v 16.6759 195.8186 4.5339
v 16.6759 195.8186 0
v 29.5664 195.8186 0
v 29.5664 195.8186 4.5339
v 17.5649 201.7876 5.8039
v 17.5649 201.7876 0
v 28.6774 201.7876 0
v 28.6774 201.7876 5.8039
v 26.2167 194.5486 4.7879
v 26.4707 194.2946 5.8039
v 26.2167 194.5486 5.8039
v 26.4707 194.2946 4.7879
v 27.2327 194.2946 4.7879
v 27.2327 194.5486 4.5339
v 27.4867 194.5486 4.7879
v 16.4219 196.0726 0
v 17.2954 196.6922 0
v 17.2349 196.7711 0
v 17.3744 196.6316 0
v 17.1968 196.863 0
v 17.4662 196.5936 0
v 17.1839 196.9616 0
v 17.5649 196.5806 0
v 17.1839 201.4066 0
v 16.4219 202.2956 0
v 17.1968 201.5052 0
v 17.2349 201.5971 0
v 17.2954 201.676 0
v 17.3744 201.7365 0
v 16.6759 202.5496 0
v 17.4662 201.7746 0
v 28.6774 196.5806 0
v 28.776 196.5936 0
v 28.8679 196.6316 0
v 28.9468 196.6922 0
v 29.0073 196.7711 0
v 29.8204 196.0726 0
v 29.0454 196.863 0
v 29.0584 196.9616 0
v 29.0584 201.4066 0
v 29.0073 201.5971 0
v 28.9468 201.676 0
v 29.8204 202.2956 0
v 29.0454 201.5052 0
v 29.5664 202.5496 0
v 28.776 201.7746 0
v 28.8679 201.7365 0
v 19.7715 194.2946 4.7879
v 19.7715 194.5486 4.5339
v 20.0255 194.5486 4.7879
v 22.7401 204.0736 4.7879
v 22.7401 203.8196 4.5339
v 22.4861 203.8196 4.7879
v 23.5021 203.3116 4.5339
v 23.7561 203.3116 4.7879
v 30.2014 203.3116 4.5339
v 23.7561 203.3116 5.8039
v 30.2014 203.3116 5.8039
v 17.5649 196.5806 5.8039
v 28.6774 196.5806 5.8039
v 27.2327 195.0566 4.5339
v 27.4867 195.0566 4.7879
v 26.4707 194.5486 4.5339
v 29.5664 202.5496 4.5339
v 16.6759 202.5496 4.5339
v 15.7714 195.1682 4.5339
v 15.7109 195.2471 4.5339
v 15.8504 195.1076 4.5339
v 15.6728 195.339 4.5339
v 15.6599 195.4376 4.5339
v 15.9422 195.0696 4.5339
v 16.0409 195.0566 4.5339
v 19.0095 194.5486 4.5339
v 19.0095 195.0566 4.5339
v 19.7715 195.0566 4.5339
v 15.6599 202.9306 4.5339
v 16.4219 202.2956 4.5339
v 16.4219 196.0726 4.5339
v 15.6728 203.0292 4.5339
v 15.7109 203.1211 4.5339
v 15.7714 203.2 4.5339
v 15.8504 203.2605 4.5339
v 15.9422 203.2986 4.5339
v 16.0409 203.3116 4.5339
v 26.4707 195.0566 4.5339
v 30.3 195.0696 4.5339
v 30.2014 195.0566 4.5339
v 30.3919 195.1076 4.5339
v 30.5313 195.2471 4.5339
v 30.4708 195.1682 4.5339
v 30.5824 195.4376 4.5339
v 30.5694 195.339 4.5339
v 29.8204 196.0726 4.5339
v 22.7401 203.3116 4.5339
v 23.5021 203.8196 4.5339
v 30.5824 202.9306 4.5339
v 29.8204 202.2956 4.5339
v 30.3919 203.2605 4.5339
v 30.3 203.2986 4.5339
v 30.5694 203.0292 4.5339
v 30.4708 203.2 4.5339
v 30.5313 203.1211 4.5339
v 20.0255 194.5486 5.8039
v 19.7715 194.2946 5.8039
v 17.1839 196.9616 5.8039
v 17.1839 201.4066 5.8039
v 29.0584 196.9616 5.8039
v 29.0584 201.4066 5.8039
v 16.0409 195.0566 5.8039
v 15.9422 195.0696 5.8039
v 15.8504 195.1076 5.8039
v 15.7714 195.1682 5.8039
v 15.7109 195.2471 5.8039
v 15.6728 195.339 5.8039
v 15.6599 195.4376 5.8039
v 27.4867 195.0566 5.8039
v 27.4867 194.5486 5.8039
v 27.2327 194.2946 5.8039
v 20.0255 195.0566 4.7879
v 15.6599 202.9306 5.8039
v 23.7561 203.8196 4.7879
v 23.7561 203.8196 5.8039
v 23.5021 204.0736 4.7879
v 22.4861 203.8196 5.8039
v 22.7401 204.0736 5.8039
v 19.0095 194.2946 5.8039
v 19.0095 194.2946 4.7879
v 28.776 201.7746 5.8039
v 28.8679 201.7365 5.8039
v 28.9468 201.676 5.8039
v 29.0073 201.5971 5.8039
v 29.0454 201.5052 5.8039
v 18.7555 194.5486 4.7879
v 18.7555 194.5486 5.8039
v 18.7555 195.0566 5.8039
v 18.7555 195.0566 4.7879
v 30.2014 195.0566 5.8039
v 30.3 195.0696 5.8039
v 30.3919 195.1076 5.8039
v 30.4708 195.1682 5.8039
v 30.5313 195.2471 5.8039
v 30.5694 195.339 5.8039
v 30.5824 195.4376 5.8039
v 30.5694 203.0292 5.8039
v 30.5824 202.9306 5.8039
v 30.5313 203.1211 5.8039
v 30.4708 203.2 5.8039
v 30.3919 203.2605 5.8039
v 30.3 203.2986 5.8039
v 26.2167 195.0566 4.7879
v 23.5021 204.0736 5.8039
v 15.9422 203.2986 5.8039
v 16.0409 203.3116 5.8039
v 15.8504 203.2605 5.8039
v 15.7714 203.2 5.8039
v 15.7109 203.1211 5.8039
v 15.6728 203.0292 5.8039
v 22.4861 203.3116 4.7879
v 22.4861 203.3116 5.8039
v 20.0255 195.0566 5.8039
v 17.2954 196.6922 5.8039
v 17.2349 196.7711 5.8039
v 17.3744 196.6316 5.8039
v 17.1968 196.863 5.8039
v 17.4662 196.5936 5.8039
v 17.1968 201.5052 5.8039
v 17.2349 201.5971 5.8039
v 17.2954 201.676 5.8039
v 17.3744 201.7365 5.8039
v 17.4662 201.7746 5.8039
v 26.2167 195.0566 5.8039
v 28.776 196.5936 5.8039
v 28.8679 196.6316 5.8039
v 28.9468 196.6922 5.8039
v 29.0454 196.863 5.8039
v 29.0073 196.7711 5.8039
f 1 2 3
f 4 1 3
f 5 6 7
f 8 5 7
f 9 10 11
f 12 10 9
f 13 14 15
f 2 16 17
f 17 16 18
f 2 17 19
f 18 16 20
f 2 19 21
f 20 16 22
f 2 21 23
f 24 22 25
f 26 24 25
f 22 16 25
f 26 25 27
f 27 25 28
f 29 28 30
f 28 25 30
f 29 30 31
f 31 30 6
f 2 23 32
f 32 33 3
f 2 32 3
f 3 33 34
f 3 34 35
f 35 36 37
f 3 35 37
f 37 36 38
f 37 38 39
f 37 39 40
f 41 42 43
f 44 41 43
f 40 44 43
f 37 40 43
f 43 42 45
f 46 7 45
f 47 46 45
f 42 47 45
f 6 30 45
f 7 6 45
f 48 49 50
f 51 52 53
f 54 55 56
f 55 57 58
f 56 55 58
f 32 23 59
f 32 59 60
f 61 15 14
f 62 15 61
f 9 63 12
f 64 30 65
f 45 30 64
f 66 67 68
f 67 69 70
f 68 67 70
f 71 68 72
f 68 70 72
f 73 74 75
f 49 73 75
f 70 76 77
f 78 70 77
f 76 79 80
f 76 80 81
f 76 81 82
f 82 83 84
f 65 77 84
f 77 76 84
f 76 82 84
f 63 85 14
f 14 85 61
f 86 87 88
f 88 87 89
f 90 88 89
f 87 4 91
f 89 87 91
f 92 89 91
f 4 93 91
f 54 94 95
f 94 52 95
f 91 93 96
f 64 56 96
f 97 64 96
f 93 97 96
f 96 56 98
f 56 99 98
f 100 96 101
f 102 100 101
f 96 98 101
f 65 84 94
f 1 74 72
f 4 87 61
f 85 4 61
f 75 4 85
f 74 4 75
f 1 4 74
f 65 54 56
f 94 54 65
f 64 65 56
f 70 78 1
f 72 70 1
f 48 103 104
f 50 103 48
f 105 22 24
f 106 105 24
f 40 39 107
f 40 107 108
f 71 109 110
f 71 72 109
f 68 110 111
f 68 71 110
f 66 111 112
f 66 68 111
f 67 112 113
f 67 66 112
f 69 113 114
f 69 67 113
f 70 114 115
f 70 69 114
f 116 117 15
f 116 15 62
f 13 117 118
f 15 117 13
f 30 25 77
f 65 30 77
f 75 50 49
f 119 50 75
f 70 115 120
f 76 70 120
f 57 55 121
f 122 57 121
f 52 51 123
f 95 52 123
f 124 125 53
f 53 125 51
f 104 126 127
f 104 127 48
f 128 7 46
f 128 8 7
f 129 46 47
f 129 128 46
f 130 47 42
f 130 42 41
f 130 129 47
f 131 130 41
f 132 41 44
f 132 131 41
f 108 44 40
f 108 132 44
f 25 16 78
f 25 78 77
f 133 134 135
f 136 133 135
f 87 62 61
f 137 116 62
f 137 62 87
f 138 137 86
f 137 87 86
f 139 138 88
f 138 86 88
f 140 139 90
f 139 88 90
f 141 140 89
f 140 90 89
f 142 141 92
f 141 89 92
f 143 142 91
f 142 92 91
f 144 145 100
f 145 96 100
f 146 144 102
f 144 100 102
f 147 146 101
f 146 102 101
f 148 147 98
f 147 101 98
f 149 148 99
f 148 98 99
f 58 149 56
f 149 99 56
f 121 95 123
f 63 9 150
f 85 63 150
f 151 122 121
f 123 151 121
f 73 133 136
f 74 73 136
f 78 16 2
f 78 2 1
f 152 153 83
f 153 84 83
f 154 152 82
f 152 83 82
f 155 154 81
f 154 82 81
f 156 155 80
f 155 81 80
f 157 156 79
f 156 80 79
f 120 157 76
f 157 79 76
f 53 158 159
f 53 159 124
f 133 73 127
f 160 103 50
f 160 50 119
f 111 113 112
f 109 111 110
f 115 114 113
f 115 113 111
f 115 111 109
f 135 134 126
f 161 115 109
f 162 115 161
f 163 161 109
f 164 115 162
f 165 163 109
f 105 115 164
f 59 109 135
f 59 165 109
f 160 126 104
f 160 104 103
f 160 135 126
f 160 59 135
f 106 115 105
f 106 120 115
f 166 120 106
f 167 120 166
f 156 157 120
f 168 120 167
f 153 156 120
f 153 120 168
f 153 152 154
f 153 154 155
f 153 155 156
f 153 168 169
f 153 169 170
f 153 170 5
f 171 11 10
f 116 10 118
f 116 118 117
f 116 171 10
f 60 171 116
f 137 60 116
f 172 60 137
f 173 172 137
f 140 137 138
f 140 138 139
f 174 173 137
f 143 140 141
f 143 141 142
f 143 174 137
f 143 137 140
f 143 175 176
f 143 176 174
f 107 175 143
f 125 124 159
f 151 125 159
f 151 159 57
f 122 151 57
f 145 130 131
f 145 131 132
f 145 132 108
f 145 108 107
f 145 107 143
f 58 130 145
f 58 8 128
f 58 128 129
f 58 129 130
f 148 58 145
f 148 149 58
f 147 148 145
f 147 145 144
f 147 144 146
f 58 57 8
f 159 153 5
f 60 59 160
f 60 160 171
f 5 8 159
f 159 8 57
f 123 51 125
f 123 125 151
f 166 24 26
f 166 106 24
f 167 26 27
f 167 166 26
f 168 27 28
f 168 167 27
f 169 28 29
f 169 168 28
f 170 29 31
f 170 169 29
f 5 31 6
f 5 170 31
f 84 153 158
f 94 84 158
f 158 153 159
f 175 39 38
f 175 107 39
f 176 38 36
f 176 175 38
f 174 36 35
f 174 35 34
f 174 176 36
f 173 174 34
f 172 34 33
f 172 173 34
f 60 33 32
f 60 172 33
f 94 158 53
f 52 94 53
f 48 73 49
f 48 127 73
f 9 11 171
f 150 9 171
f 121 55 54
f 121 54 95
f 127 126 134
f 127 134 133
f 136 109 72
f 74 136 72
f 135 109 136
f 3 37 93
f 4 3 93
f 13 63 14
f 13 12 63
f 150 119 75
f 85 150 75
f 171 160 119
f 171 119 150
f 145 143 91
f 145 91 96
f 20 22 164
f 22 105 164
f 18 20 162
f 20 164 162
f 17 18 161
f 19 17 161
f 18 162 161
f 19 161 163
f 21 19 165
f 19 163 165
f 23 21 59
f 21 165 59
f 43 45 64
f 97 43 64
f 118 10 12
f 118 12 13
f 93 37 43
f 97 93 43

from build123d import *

# Parameters (mm, degrees)
SKETCH1_W           = 13.3985
SKETCH1_H           = 6.731
SKETCH1_W_2         = 11.8745
SKETCH1_H_2         = 5.207
EXTRUDE_THIN1_DEPTH = 5.8039
SKETCH2_W           = 14.9225
SKETCH2_H           = 8.255
SKETCH2_W_2         = 13.3985
SKETCH2_H_2         = 6.731
EXTRUDE_THIN2_DEPTH = 1.27
SKETCH4_W           = 1.27
SKETCH4_H           = 0.762
BOSS_EXTRUDE1_DEPTH = 1.27
CHAMFER1_SIZE       = 0.254
FILLET1_R           = 0.381


with BuildPart() as part:
    # Sketch1 → Extrude-Thin1 (new body)
    with BuildSketch(Plane.XY):
        with Locations((23.121102666, 199.184077883)):
            Rectangle(SKETCH1_W, SKETCH1_H)
        with Locations((23.121102666, 199.184077883)):
            Rectangle(SKETCH1_W_2, SKETCH1_H_2, mode=Mode.SUBTRACT)
    extrude(amount=EXTRUDE_THIN1_DEPTH)

    # Sketch2 → Extrude-Thin2 (add)
    with BuildSketch(Plane.XY.offset(5.8039)):
        with Locations((23.121102666, 199.184077883)):
            Rectangle(SKETCH2_W, SKETCH2_H)
        with Locations((23.121102666, 199.184077883)):
            Rectangle(SKETCH2_W_2, SKETCH2_H_2, mode=Mode.SUBTRACT)
    extrude(amount=-EXTRUDE_THIN2_DEPTH)

    # Sketch4 → Boss-Extrude1 (add)
    with BuildSketch(Plane.XY.offset(5.8039)):
        with Locations((23.121102666, 203.692577883)):
            Rectangle(SKETCH4_W, SKETCH4_H)
        with Locations((26.851727666, 194.675577883)):
            Rectangle(SKETCH4_W, SKETCH4_H)
        with Locations((19.390477666, 194.675577883)):
            Rectangle(SKETCH4_W, SKETCH4_H)
    extrude(amount=-BOSS_EXTRUDE1_DEPTH)

    # Chamfer1
    chamfer1_edges = [part.edges().sort_by_distance(p)[0] for p in [
        (16.421852666, 195.818577883, 2.26695),
        (16.421852666, 202.549577883, 2.26695),
        (29.820352666, 202.549577883, 2.26695),
        (29.820352666, 195.818577883, 2.26695),
        (22.486102666, 203.692577883, 4.5339),
        (23.121102666, 204.073577883, 4.5339),
        (22.486102666, 204.073577883, 5.1689),
        (23.756102666, 203.692577883, 4.5339),
        (23.756102666, 204.073577883, 5.1689),
        (27.486727666, 194.675577883, 4.5339),
        (26.851727666, 194.294577883, 4.5339),
        (27.486727666, 194.294577883, 5.1689),
        (26.216727666, 194.675577883, 4.5339),
        (26.216727666, 194.294577883, 5.1689),
        (20.025477666, 194.675577883, 4.5339),
        (19.390477666, 194.294577883, 4.5339),
        (20.025477666, 194.294577883, 5.1689),
        (18.755477666, 194.675577883, 4.5339),
        (18.755477666, 194.294577883, 5.1689),
    ]]
    chamfer(chamfer1_edges, length=CHAMFER1_SIZE)

    # Fillet1
    fillet1_edges = [part.edges().sort_by_distance(p)[0] for p in [
        (15.659852666, 203.311577883, 5.1689),
        (15.659852666, 195.056577883, 5.1689),
        (30.582352666, 195.056577883, 5.1689),
        (30.582352666, 203.311577883, 5.1689),
        (29.058352666, 201.787577883, 2.90195),
        (17.183852666, 201.787577883, 2.90195),
        (29.058352666, 196.580577883, 2.90195),
        (17.183852666, 196.580577883, 2.90195),
    ]]
    fillet(fillet1_edges, radius=FILLET1_R)


solid = part.part
